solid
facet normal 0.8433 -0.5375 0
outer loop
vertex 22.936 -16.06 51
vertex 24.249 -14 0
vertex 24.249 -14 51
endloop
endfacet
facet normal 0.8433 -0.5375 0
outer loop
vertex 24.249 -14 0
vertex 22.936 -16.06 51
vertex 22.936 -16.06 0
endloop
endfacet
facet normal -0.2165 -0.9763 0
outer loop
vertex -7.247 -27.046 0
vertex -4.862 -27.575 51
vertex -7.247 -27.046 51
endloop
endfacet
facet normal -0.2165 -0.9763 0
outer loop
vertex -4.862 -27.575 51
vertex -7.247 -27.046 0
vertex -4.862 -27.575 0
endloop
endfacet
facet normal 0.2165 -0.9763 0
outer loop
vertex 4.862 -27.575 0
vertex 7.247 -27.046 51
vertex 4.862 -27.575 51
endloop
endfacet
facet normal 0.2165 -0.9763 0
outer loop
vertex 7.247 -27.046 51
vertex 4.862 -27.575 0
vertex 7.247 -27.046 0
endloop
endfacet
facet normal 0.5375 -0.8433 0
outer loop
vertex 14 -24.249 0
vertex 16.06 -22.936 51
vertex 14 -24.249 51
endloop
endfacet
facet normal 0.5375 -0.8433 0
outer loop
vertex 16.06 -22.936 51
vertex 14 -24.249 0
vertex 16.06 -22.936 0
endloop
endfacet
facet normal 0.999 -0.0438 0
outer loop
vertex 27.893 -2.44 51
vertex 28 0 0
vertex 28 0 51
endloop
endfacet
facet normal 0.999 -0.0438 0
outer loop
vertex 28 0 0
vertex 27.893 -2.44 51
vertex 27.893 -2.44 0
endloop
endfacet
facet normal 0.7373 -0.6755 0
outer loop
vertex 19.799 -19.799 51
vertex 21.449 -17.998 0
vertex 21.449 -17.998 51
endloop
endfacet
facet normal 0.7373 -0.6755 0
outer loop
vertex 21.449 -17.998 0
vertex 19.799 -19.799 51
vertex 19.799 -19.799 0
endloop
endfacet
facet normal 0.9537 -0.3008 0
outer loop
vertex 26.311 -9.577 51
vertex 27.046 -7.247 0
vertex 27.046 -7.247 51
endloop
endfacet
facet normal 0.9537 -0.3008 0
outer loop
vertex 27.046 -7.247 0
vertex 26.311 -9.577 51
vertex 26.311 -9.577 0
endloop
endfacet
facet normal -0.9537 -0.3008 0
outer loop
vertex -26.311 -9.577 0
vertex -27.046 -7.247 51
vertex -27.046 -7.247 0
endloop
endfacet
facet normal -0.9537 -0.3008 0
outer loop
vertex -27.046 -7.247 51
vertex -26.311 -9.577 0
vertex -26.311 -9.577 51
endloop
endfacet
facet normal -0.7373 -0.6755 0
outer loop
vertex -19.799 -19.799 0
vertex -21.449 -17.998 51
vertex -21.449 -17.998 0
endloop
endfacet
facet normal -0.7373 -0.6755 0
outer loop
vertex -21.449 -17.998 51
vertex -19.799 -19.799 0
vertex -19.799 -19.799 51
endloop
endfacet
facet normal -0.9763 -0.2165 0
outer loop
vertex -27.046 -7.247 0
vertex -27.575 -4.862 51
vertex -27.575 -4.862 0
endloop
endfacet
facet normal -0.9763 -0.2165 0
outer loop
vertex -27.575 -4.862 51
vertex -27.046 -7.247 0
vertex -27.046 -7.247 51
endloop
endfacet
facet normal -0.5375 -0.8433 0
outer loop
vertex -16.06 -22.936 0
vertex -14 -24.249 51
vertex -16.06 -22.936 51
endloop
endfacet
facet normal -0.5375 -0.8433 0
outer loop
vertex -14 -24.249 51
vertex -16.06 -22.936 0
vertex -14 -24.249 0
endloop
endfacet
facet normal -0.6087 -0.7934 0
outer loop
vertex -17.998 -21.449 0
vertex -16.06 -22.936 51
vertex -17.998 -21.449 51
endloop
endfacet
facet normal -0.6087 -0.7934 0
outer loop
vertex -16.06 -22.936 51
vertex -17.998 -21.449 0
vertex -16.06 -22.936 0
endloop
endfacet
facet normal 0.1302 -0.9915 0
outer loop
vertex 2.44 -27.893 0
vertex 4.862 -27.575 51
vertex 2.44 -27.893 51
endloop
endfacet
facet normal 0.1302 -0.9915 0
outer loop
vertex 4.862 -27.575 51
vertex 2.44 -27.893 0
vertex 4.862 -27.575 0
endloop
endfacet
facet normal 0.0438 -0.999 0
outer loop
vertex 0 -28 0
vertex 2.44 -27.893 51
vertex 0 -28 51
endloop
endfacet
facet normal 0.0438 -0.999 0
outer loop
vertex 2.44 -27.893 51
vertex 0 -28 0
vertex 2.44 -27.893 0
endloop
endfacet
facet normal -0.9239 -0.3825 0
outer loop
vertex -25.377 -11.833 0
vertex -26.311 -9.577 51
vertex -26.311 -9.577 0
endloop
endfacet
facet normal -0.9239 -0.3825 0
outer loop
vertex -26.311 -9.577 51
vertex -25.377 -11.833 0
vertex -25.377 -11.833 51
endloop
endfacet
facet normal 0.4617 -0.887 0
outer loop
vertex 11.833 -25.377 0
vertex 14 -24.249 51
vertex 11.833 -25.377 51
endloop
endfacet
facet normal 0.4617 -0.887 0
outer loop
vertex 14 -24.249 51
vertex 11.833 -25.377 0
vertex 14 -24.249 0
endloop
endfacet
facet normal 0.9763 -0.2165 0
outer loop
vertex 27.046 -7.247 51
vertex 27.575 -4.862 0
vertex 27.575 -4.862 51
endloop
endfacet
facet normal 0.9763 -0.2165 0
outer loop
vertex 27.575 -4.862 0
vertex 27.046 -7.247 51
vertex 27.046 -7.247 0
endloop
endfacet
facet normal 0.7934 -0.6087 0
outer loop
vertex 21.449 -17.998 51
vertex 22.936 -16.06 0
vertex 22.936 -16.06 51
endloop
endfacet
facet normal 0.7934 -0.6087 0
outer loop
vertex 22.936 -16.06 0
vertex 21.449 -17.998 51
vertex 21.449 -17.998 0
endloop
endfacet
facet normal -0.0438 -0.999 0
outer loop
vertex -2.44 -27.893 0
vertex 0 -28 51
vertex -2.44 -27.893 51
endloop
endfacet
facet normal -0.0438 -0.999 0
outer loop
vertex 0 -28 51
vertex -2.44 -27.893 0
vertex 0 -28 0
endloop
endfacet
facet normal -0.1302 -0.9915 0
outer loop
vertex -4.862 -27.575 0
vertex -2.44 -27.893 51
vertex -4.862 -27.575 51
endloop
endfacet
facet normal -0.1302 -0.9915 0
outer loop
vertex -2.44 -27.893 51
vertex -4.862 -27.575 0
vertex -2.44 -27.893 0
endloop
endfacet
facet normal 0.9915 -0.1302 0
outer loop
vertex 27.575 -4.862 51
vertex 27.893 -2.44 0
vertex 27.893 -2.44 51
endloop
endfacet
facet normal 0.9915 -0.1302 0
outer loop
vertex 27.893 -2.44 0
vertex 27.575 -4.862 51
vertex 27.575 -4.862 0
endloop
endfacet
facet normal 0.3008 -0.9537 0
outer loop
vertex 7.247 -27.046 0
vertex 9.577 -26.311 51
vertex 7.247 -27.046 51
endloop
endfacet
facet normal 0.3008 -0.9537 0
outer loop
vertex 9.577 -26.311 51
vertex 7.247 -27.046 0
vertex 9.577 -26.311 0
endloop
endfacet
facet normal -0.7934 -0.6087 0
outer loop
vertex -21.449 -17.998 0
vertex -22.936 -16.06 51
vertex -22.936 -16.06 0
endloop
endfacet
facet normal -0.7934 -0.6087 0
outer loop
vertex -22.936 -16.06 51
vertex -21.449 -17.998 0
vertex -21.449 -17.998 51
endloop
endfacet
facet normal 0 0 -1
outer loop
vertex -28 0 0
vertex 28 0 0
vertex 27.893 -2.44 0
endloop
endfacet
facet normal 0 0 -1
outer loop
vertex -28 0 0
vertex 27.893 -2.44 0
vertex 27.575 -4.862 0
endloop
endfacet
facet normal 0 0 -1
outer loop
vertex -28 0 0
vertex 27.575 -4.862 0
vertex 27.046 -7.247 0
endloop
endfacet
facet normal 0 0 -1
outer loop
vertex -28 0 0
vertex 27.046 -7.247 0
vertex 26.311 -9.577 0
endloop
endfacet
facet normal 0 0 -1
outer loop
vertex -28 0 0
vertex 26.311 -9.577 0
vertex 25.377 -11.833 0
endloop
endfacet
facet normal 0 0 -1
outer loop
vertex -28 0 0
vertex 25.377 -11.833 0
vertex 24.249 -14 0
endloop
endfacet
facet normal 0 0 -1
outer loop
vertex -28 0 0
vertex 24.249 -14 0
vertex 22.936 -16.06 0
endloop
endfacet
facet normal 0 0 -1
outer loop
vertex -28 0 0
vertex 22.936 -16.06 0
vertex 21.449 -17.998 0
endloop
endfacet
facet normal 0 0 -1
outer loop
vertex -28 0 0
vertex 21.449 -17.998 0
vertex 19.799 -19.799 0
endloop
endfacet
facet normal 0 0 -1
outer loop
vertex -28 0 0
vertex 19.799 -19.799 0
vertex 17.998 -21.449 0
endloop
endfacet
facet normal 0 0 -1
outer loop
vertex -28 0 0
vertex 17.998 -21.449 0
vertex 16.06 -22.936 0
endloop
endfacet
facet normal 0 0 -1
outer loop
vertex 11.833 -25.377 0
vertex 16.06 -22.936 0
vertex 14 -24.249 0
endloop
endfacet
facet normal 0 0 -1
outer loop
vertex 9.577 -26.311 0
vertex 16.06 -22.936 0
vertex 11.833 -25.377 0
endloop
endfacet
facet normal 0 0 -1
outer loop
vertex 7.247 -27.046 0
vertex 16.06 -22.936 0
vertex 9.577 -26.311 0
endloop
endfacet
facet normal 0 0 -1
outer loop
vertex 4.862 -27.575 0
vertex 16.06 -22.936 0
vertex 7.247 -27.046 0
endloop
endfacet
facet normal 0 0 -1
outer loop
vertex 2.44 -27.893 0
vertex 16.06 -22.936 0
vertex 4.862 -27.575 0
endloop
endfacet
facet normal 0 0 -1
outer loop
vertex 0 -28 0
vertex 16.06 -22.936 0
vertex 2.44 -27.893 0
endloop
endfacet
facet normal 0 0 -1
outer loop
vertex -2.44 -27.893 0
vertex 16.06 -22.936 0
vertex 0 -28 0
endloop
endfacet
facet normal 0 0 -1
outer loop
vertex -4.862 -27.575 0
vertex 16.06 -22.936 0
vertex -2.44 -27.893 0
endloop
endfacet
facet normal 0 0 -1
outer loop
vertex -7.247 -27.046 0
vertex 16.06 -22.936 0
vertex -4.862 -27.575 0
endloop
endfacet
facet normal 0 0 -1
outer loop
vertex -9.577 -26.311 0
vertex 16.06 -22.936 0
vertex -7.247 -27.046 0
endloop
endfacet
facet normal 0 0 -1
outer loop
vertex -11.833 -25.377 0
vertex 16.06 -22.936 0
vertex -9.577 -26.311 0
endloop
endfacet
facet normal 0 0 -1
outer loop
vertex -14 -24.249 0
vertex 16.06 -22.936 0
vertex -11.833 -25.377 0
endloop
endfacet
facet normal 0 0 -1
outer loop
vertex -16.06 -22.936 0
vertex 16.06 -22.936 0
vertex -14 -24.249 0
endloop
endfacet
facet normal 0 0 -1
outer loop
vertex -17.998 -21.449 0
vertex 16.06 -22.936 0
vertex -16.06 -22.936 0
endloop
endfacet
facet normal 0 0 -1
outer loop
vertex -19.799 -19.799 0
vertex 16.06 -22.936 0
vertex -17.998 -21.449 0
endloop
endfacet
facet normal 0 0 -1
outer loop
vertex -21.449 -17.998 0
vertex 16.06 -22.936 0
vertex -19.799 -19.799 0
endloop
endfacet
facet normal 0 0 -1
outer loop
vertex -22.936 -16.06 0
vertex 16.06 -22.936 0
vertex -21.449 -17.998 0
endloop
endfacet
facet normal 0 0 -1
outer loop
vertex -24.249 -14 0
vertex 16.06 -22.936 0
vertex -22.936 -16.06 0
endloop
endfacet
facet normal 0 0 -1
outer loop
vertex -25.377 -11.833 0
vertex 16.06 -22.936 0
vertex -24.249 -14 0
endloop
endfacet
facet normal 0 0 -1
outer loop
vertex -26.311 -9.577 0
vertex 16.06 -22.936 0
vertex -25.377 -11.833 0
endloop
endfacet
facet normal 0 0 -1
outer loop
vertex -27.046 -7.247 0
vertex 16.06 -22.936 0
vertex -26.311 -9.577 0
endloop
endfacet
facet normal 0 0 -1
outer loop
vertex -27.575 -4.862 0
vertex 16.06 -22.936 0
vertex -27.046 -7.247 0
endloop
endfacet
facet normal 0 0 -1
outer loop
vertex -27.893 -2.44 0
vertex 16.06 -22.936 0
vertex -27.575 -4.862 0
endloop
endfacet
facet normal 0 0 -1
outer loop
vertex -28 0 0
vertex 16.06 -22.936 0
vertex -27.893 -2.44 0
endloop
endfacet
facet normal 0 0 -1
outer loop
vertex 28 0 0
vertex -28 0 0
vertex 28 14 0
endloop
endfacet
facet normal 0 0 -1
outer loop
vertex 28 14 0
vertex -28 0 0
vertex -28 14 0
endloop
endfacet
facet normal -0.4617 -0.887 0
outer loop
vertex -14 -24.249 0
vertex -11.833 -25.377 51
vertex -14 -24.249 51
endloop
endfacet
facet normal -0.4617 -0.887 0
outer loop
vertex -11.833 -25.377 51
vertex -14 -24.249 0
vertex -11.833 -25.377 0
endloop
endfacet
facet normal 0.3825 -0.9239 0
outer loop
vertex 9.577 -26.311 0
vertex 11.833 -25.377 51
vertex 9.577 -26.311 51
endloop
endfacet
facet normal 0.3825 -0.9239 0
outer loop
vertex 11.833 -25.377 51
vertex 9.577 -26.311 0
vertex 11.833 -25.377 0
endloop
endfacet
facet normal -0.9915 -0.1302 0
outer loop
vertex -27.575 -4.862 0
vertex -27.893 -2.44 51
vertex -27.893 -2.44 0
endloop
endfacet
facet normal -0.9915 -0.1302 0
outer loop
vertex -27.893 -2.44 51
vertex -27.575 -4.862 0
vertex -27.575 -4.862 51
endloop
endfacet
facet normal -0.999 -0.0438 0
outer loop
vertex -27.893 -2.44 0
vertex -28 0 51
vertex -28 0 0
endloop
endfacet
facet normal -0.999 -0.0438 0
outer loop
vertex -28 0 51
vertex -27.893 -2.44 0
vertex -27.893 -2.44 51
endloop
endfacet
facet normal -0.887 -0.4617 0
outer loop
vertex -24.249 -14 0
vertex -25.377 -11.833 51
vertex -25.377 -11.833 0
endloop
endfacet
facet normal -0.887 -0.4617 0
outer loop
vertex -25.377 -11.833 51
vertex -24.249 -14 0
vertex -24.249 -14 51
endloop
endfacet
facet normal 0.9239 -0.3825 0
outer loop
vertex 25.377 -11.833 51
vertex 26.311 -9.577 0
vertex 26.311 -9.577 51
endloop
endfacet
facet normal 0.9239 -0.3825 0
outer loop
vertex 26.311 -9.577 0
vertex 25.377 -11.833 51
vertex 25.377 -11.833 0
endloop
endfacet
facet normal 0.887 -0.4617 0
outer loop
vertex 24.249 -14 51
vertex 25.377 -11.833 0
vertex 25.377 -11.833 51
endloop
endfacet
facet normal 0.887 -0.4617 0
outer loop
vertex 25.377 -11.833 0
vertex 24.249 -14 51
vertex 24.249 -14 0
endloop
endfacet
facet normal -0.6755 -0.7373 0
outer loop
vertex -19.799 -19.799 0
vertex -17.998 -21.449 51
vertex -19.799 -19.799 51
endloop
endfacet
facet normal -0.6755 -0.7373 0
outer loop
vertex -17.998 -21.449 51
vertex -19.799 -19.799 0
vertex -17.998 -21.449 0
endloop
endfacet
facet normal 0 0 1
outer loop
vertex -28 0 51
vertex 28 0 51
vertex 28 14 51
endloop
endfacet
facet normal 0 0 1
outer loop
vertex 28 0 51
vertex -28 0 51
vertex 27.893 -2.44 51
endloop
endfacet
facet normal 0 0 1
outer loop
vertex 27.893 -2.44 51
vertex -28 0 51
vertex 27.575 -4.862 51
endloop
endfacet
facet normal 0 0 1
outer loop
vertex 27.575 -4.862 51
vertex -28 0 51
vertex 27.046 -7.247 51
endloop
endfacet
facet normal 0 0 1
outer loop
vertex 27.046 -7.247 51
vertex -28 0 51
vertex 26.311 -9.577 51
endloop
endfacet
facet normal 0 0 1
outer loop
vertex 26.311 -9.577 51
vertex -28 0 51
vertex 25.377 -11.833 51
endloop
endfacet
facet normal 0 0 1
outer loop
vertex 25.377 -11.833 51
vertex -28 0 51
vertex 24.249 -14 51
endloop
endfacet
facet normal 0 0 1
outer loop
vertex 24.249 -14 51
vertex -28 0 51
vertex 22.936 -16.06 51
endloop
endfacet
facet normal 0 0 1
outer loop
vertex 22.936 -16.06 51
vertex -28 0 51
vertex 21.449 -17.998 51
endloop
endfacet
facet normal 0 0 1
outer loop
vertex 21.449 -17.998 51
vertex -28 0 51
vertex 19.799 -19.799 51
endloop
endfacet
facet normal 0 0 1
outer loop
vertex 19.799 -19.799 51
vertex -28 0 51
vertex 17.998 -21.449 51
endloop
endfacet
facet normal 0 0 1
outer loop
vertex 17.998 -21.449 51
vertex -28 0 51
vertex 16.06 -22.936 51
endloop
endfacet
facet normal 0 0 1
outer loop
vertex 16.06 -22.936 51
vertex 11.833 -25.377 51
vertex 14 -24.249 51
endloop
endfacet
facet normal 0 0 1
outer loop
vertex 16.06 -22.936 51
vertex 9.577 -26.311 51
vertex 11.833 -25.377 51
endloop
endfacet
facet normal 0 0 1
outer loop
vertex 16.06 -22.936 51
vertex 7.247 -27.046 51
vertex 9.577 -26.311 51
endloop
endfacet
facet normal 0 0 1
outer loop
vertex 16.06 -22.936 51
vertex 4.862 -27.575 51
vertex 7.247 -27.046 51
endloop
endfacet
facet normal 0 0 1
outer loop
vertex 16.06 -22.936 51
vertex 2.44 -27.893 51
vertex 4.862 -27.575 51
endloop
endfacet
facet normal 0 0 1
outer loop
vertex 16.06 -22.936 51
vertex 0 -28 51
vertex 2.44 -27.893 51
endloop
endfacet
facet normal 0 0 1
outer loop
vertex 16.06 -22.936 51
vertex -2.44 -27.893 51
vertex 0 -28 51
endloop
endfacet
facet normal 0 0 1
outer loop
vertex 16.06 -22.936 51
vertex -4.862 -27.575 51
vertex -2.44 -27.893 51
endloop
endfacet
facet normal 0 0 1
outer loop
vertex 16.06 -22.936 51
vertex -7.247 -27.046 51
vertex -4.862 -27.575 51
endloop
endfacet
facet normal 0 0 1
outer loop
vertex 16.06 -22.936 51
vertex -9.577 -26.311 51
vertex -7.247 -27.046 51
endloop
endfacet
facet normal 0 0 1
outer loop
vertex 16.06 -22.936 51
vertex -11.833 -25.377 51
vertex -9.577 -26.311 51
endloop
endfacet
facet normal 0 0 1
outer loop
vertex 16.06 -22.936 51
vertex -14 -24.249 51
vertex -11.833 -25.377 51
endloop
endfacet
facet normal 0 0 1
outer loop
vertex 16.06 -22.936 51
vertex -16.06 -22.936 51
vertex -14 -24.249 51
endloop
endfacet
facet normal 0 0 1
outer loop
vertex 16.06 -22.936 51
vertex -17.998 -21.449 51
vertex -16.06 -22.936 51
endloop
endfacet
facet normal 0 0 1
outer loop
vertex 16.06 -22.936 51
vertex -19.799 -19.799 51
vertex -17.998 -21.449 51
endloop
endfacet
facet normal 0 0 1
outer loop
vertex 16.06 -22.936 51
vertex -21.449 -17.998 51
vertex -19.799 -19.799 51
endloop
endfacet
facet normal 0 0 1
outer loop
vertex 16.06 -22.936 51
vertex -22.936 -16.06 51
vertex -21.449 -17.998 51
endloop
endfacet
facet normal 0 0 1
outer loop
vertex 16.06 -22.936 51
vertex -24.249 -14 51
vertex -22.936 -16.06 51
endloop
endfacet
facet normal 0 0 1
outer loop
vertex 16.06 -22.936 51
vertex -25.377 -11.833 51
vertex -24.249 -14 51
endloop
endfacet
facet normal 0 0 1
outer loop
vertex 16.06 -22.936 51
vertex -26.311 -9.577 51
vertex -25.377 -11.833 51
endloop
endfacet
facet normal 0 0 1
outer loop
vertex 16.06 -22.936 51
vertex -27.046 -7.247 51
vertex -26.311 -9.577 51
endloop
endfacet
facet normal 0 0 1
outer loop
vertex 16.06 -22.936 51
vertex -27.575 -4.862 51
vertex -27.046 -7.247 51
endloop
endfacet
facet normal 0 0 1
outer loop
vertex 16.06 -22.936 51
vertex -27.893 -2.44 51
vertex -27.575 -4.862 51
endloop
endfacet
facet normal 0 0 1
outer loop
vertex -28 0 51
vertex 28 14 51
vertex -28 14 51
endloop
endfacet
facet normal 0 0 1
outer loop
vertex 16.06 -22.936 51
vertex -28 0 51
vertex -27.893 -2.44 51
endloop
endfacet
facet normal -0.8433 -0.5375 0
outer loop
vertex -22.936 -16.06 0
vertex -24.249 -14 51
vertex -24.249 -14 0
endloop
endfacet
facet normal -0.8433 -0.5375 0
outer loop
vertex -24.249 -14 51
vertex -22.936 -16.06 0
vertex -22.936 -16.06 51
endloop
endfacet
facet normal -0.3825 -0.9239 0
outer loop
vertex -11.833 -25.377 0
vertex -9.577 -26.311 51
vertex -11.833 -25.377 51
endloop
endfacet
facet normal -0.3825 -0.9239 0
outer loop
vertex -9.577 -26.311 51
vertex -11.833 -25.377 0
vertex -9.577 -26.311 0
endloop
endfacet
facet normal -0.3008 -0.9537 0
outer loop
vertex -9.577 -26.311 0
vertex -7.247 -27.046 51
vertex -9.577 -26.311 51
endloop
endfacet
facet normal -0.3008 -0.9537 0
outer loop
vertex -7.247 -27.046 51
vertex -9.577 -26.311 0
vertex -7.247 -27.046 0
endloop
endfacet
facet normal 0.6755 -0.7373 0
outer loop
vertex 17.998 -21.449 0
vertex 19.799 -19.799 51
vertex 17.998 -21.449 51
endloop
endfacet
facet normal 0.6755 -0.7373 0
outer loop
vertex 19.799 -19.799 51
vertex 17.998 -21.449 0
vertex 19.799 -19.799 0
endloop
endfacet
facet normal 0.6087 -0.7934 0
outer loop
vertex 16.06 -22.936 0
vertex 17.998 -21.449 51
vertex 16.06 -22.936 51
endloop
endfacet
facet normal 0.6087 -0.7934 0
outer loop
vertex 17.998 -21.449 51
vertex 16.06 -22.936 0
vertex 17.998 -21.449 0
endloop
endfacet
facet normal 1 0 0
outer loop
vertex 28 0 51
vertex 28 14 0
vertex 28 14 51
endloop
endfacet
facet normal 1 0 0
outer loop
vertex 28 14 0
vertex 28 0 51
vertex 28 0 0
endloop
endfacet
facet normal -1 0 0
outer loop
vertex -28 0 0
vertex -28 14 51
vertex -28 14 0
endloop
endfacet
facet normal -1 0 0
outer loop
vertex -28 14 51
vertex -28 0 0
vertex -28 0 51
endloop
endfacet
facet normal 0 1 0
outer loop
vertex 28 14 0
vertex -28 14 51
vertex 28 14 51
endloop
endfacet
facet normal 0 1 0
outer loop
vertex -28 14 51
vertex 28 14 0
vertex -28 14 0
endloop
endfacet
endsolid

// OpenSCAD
$fn=36*2;
$topinner=28;
$height = 35+16;

module top()
{
cylinder(r=$topinner,h=$height);
translate([-$topinner,0,0])
cube([$topinner*2,$topinner/2,$height]);
}

difference()
{
top();
  
translate([-$topinner,$topinner/2,0])
cube([$topinner*2,$topinner/2,$height]);
}
